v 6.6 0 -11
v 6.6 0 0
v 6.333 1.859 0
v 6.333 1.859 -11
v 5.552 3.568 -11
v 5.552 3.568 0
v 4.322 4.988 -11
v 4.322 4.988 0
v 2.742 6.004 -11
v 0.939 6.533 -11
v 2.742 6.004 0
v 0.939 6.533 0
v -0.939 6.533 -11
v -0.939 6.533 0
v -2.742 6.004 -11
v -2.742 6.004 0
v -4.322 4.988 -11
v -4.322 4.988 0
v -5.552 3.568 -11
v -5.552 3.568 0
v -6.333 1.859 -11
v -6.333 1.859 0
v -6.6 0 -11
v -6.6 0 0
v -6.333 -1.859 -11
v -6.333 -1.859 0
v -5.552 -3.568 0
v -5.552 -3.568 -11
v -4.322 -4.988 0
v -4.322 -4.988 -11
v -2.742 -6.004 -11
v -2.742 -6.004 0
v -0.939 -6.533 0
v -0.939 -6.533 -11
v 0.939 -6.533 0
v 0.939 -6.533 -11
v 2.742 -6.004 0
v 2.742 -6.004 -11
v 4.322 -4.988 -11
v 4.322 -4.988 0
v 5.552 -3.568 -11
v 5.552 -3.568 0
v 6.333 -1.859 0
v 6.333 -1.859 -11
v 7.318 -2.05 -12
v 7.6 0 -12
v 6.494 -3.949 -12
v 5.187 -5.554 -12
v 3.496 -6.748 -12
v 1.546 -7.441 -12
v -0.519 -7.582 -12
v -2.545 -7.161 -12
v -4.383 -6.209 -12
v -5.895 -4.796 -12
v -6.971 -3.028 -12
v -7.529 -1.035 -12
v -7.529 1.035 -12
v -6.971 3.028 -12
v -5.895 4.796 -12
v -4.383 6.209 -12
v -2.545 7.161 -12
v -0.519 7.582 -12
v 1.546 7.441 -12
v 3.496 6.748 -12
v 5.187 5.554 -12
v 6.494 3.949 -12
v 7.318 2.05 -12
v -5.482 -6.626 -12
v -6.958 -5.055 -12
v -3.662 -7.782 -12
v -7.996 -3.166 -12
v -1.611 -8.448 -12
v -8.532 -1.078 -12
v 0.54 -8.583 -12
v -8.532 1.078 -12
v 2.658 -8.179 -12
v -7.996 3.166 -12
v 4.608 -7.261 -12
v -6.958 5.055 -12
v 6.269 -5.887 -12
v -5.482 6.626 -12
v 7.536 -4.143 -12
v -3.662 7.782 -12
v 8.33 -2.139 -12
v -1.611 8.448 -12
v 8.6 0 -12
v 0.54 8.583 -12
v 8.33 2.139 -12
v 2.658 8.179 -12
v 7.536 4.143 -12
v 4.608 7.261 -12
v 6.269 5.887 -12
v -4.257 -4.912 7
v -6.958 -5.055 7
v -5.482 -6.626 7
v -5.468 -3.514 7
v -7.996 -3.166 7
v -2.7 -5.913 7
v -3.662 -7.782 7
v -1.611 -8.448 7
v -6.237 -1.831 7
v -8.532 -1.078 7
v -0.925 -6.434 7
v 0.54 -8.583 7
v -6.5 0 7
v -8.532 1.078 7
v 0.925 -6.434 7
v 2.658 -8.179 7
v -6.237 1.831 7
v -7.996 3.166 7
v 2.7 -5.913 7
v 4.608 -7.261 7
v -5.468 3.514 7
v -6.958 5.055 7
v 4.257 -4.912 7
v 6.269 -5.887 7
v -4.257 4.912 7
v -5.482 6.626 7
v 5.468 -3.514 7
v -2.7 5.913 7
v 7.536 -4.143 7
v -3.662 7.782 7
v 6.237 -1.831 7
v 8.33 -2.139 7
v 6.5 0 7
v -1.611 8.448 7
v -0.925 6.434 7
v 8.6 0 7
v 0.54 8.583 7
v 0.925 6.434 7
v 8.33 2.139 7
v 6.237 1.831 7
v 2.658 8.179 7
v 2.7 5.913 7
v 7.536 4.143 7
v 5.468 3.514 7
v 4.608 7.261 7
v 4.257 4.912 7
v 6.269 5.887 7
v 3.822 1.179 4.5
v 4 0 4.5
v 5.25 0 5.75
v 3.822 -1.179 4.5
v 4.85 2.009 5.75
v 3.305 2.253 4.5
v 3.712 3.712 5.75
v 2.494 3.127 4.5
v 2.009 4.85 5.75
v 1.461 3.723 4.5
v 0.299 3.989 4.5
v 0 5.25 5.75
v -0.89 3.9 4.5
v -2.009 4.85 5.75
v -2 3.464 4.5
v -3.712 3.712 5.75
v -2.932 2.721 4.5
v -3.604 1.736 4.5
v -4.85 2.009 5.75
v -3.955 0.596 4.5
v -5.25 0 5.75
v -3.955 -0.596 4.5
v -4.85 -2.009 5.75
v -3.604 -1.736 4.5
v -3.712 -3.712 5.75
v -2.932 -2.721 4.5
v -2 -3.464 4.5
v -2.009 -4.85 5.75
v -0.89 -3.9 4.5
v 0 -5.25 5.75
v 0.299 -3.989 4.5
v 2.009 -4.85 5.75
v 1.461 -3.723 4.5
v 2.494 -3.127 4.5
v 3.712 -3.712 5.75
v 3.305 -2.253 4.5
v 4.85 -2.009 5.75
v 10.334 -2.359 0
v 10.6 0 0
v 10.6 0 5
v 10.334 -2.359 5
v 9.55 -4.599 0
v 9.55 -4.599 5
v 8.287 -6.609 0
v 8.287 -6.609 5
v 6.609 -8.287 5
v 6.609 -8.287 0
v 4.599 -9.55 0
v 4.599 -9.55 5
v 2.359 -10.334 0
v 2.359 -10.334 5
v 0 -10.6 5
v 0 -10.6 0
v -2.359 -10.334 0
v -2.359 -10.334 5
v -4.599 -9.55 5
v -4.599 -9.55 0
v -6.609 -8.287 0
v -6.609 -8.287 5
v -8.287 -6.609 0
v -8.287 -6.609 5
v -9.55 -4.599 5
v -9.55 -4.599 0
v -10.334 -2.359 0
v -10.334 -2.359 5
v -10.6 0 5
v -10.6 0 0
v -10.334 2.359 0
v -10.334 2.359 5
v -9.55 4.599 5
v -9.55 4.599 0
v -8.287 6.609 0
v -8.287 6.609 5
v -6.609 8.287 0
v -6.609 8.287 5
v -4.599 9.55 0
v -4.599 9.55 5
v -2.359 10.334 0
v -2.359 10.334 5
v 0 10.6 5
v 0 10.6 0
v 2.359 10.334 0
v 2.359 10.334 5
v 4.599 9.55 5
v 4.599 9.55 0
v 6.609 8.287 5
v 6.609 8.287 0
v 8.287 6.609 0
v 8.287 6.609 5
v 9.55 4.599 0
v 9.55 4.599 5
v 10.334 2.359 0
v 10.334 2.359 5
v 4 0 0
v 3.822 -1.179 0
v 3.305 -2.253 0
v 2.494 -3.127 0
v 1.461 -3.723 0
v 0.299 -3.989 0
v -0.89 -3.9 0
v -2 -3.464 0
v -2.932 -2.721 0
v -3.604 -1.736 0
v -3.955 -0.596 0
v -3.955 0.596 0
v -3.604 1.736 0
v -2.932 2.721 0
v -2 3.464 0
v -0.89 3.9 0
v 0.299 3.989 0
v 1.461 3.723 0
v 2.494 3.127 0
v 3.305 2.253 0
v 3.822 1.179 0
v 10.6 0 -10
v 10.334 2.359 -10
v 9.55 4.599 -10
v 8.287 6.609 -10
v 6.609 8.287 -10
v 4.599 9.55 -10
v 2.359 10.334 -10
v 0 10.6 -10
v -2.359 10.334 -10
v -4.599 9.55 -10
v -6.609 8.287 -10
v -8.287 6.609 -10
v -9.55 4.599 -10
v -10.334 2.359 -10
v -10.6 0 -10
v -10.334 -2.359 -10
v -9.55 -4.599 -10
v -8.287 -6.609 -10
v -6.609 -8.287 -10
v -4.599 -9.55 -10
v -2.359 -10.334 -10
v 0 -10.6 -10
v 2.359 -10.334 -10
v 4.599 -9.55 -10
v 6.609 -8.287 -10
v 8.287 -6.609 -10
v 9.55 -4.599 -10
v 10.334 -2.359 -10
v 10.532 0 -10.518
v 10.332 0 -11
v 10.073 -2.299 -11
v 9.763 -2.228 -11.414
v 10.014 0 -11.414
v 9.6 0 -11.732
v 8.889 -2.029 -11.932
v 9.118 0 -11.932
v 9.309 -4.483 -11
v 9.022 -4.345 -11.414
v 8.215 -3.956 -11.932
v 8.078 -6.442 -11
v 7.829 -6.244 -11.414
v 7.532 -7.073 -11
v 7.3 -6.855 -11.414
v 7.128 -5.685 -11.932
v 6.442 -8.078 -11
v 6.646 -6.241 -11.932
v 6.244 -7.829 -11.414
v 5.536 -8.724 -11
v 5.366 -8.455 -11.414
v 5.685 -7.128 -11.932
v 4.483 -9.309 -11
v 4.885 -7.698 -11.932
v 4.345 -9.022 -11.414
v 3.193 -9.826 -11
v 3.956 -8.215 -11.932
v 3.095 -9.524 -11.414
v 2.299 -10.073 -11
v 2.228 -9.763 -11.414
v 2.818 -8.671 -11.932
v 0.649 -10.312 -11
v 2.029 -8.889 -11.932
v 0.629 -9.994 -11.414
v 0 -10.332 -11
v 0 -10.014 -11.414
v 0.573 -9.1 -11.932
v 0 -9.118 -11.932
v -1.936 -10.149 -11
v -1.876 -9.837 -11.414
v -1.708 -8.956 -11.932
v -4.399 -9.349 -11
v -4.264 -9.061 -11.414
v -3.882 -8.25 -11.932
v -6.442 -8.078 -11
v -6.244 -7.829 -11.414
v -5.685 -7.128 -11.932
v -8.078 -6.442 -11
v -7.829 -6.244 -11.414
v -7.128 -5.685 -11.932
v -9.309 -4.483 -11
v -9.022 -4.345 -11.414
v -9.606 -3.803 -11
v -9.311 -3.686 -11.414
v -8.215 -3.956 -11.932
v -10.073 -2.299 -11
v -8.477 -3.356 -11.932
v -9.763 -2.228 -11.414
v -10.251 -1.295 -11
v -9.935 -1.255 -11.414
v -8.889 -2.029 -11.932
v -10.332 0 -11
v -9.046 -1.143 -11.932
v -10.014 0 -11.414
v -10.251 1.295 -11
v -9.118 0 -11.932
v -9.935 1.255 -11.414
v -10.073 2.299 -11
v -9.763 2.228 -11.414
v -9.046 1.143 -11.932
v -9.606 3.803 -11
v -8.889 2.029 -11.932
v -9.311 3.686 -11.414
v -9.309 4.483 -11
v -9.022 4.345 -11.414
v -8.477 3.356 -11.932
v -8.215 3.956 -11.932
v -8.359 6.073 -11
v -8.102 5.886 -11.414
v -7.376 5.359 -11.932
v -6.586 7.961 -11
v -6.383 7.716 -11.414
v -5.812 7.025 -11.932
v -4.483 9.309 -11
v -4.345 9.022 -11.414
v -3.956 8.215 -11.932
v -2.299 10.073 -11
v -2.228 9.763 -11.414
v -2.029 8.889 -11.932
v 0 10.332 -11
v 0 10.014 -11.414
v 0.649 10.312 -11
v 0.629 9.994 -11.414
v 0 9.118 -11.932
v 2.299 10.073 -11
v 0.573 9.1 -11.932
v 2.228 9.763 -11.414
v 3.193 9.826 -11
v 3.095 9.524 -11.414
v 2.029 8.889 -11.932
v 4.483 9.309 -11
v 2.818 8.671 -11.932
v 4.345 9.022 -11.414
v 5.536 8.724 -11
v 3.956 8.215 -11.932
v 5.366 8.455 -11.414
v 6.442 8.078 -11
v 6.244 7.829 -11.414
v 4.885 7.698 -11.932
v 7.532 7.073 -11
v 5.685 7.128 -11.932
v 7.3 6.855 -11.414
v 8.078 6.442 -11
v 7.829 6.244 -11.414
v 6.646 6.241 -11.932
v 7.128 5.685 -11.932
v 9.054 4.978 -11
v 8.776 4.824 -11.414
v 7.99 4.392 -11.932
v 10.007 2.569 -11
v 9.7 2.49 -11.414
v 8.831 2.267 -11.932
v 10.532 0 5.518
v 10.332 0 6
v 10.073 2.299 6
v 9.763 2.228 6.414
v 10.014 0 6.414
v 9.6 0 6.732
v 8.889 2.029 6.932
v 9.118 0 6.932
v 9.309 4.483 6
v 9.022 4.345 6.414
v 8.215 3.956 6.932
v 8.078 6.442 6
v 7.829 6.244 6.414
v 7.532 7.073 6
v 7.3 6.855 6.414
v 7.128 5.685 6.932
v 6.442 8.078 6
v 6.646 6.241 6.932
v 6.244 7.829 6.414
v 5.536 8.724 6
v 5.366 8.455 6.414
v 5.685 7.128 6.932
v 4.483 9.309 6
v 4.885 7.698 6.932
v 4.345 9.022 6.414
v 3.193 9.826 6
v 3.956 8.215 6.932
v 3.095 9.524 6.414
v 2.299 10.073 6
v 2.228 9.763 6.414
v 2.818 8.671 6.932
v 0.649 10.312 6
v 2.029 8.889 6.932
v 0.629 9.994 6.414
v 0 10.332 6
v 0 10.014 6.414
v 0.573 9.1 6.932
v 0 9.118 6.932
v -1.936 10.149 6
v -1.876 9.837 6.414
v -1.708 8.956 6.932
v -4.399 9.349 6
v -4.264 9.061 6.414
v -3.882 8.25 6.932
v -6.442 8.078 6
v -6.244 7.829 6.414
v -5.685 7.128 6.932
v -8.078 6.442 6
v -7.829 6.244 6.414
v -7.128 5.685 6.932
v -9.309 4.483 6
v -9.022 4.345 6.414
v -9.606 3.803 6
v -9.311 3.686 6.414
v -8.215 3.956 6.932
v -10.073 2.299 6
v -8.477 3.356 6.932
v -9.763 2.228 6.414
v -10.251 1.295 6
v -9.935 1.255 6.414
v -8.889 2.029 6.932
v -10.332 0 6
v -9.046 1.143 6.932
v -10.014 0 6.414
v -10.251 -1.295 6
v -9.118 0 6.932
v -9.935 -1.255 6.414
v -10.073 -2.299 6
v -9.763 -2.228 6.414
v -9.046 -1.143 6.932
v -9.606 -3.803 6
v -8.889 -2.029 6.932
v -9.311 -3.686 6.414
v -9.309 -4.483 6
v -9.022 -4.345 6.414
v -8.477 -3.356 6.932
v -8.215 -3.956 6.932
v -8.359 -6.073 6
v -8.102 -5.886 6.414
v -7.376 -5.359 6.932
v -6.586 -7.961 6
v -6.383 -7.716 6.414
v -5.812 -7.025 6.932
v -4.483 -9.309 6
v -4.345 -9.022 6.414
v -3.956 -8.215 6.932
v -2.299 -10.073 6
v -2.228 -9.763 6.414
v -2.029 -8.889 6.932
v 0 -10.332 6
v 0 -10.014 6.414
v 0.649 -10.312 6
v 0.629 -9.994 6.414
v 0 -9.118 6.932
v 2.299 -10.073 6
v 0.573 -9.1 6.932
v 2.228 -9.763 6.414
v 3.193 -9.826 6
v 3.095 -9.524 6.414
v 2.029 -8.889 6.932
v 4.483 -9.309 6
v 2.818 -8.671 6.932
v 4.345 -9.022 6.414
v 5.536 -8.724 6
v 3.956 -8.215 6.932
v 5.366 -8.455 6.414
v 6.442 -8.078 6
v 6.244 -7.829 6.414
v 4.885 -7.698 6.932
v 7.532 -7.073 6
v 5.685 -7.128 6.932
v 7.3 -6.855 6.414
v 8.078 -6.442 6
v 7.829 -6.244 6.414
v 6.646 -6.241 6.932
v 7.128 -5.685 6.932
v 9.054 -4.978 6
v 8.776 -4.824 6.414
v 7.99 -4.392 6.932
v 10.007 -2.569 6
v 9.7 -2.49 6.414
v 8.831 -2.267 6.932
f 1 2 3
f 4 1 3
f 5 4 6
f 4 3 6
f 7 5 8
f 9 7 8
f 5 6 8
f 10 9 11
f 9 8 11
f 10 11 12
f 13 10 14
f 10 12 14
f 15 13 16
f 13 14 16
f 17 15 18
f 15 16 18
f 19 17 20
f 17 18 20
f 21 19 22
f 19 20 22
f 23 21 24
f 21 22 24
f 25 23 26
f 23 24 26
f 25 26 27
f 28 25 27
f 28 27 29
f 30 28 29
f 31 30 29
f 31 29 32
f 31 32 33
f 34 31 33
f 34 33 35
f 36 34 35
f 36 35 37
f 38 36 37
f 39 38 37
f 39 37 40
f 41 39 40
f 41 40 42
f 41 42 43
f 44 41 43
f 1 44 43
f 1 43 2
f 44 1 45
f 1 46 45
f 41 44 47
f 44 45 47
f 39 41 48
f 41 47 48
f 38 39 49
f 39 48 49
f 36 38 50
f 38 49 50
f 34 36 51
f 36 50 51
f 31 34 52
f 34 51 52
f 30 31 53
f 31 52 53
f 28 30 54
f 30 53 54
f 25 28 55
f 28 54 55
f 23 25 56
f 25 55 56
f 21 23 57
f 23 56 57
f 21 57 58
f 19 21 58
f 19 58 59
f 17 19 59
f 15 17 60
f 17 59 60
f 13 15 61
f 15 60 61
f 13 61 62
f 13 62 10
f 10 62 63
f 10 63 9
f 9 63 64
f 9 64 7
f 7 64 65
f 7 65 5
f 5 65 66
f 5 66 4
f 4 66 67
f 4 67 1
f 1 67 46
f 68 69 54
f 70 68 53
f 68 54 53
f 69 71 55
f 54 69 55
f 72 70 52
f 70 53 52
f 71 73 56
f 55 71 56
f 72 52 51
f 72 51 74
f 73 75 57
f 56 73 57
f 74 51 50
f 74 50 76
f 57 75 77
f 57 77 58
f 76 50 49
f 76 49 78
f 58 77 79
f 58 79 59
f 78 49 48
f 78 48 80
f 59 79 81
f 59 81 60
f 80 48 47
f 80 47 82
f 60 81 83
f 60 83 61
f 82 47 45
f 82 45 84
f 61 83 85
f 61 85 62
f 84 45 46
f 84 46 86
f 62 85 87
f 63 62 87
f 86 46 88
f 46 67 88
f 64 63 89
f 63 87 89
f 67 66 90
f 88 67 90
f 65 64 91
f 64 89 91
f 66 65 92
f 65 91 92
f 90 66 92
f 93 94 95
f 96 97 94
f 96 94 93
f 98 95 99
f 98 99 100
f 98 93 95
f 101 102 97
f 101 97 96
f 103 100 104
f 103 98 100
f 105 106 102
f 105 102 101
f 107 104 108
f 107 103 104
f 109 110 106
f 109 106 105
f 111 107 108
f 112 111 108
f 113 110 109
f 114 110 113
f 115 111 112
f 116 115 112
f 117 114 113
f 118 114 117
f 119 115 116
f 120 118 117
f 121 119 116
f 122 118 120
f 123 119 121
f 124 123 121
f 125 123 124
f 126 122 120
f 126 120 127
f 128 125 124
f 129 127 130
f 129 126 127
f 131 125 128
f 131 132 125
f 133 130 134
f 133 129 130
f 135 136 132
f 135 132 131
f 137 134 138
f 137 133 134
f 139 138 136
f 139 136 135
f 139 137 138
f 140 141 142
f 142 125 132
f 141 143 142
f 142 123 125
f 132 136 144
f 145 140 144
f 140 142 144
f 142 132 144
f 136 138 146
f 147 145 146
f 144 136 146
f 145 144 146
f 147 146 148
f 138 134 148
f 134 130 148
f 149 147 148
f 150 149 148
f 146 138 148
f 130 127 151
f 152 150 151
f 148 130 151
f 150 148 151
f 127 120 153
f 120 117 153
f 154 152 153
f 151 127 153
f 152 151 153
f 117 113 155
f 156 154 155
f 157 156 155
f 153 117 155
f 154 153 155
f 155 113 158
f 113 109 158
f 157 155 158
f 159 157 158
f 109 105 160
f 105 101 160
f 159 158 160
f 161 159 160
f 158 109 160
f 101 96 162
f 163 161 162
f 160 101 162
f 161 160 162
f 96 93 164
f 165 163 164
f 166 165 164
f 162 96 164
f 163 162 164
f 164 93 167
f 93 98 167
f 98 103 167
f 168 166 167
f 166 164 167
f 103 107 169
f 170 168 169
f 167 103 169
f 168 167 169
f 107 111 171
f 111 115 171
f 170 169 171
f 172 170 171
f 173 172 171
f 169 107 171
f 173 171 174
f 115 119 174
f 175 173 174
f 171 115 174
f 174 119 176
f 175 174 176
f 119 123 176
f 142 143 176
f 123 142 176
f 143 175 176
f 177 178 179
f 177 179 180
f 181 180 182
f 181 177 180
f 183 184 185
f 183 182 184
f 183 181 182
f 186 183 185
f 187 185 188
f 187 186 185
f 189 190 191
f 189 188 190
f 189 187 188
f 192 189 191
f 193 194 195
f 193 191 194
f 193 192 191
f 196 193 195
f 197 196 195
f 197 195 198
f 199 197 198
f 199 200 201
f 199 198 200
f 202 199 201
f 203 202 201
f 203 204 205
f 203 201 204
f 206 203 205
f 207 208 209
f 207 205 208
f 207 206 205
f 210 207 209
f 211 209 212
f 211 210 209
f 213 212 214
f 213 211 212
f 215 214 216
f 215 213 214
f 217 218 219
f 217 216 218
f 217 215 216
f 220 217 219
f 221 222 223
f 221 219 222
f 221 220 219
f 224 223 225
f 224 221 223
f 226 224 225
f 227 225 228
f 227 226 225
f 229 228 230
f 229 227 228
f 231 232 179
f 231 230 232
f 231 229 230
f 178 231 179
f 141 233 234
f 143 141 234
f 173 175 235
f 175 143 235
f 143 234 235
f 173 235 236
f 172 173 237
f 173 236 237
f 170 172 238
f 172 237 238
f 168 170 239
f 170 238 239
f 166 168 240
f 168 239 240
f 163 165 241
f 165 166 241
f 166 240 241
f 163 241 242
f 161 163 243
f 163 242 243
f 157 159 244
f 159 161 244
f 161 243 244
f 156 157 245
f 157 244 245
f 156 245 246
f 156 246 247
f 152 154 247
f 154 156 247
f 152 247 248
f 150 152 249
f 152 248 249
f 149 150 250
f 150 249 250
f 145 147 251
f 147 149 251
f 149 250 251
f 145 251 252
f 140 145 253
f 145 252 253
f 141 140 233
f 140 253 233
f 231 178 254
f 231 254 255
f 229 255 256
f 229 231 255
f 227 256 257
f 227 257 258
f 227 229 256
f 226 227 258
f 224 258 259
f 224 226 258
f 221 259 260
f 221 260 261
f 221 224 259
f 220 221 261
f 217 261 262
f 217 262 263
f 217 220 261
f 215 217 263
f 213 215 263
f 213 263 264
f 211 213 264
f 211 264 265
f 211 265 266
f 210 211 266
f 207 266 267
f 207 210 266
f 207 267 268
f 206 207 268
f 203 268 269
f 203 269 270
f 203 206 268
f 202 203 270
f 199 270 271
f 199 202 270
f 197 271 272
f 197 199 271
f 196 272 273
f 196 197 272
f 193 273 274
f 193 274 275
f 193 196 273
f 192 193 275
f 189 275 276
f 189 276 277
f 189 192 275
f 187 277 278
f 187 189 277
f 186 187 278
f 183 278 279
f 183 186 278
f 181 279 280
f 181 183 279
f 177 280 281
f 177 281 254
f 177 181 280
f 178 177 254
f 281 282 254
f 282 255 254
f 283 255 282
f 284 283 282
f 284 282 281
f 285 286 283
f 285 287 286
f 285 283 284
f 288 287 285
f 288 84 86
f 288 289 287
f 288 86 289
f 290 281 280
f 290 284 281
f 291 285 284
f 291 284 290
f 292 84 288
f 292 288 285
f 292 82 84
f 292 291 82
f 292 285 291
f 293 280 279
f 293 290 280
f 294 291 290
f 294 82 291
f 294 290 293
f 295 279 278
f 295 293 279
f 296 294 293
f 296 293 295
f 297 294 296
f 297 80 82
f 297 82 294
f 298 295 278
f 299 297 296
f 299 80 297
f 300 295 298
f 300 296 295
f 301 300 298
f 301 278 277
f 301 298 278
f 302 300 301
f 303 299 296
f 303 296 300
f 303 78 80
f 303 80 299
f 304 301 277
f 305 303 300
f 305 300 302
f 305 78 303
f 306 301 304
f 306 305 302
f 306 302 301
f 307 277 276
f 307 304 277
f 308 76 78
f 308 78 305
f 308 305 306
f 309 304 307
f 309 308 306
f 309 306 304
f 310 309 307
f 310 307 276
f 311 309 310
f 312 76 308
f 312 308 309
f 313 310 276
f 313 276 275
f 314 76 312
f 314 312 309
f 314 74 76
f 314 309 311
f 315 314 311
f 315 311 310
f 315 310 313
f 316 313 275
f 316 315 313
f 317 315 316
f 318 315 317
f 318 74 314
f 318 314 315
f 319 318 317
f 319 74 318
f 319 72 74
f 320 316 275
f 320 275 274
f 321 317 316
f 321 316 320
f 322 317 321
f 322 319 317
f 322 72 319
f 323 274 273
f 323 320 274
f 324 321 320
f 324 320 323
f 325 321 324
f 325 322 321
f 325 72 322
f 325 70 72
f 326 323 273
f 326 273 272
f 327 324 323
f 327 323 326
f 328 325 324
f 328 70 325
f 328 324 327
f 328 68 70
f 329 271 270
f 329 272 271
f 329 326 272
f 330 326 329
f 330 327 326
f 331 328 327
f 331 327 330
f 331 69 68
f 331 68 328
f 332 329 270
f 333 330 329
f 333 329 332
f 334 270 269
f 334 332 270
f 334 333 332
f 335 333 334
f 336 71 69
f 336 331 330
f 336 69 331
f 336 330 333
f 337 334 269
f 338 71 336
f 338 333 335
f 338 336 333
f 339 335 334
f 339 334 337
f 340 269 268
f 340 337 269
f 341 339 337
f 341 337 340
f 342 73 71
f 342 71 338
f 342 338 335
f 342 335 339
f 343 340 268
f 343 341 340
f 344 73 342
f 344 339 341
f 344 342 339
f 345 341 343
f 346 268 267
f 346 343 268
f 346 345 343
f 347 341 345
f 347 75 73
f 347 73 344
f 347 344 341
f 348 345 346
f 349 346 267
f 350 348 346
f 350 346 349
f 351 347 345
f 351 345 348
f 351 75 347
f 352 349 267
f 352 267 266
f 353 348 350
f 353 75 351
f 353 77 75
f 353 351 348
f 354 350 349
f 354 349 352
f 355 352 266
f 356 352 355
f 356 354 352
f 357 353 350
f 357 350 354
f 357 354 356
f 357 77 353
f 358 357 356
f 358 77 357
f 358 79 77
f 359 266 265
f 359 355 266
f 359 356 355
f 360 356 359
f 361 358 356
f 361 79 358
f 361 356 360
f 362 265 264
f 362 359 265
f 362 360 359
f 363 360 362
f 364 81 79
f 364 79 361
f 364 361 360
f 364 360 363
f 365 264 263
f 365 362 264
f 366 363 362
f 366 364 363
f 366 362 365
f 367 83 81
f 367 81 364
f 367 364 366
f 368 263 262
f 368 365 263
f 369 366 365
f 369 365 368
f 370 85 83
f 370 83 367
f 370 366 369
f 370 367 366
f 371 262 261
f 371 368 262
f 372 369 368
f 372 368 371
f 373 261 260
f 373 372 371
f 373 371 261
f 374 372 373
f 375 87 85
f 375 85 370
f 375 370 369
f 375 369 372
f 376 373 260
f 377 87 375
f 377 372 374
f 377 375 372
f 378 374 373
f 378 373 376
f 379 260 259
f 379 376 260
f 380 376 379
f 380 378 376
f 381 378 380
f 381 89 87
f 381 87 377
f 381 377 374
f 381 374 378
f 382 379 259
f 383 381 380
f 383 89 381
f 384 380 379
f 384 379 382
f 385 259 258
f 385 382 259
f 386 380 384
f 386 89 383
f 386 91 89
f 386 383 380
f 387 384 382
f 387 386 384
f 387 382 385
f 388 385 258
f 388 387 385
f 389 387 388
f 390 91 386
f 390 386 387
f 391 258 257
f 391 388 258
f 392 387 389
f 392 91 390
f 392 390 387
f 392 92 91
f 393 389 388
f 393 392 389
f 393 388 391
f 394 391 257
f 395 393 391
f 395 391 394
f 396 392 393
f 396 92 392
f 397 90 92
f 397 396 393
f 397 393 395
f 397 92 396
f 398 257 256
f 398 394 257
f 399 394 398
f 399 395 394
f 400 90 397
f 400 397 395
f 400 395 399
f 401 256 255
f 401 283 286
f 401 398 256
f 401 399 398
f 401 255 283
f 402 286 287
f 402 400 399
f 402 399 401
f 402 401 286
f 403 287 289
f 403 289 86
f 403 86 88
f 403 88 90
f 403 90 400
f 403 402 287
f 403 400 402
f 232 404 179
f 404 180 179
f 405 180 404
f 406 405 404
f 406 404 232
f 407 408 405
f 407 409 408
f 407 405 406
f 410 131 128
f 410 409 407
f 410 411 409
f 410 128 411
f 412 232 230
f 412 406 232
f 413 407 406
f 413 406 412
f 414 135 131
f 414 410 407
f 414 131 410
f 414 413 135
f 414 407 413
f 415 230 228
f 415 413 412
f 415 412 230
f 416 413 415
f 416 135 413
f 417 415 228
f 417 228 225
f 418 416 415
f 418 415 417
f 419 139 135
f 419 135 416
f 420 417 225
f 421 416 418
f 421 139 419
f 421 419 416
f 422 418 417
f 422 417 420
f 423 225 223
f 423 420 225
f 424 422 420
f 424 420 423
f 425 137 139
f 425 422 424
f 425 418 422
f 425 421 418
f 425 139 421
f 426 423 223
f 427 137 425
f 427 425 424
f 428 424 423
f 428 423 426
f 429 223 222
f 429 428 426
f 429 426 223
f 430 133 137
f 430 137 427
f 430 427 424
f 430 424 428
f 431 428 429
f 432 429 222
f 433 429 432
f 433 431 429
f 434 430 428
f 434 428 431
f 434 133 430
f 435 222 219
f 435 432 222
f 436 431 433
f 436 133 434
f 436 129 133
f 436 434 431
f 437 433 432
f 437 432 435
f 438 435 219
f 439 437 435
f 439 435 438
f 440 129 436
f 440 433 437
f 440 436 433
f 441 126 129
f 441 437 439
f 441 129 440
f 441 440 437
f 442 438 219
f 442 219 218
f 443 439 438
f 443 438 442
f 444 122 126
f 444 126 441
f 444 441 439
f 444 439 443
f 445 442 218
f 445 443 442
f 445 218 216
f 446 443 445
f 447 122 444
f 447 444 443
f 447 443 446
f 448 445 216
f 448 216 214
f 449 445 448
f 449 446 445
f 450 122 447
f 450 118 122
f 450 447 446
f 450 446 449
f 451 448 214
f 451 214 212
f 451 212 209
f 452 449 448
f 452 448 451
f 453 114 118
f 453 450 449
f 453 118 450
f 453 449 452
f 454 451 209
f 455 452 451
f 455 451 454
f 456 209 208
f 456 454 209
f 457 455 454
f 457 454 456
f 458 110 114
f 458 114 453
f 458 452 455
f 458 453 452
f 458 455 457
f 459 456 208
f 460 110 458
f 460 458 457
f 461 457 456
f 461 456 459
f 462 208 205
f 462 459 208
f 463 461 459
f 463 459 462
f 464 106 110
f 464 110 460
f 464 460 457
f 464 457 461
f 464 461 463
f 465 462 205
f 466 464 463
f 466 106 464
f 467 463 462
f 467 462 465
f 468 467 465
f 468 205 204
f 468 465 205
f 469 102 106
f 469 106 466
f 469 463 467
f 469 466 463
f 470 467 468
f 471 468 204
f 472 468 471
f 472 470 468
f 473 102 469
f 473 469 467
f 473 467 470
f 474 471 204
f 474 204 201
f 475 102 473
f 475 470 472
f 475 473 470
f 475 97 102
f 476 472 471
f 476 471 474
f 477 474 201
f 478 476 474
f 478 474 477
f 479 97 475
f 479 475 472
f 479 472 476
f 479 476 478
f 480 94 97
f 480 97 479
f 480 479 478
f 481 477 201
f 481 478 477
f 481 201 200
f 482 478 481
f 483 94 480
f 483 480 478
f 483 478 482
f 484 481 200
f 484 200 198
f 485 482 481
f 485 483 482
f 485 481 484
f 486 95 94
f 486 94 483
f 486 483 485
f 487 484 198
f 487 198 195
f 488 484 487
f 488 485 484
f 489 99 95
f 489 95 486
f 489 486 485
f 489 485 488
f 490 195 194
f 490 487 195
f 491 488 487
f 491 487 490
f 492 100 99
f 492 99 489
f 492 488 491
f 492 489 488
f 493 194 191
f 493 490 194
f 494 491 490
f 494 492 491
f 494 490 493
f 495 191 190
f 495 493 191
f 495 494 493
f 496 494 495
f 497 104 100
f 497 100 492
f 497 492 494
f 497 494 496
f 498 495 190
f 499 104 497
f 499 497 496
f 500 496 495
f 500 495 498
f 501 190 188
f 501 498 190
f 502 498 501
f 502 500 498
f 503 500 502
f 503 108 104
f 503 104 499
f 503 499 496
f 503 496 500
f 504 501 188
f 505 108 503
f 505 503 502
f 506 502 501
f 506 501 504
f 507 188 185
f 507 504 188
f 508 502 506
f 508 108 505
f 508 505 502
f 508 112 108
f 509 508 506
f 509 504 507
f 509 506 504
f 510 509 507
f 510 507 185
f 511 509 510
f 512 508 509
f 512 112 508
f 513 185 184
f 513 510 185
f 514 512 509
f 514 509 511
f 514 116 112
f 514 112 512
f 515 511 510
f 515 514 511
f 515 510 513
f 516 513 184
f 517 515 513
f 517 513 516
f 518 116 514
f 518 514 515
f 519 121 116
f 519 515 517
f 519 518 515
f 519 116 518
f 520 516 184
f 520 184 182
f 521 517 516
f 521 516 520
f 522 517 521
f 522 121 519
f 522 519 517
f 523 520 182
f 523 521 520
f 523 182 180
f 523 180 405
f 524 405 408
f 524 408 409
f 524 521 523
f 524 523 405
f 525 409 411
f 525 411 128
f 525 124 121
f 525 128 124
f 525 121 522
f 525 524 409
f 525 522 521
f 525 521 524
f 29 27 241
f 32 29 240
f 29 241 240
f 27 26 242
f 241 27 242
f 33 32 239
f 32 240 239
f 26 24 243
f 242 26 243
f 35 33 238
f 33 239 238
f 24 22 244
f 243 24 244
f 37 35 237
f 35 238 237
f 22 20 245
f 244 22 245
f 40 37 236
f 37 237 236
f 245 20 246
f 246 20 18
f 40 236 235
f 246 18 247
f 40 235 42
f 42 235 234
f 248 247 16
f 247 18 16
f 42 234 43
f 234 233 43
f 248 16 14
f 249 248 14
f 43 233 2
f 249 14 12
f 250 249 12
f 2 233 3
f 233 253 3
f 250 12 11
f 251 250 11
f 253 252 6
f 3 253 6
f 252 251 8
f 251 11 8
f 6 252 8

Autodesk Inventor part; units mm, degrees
ref_plane "YZ Plane" through (0, 0, 0) normal (1, 0, 0) x (0, 1, 0)
ref_plane "XZ Plane" through (0, 0, 0) normal (0, 1, 0) x (-1, 0, 0)
ref_plane "XY Plane" through (0, 0, 0) normal (0, 0, 1) x (1, 0, 0)
sketch "Эскиз1" plane through (0, 0, 0) normal (0, 0, 1) x (1, 0, 0)
  circle A0 centre (0, 0) radius 6.6
  circle A1 centre (0, 0) radius 10.6
  dimension "d0" = 13.2
  dimension "d1" = 4
extrude "Выдавливание1" add sketch "Эскиз1" along normal blind 7 and the other way blind 12
fillet "Сопряжение1" radius 2 2 edges at (-10.6, 0, 7) (-10.6, 0, -12)
chamfer "Фаска1" distance 1 angle 45 1 edges at (-6.6, 0, -12)
ref_plane "РабПлоскость1" through (0, 0, 0) normal (0, 0, 1) x (1, 0, 0)
sketch "Эскиз2" plane through (0, 0, 0) normal (0, 0, 1) x (1, 0, 0)
  circle A0 centre (0, 0) radius 4
  circle A1 centre (0, 0) radius 8.6 projected
  circle A2 centre (0, 0) radius 7.5
  dimension "d10" = 8
  dimension "d11" = 15
extrude "Выдавливание2" add sketch "Эскиз2" along normal blind 7 contours A2
chamfer "Фаска2" distance 2.5 angle 45 1 edges at (-4, 0, 7)
properties part number "ПодпорныйКаток"
